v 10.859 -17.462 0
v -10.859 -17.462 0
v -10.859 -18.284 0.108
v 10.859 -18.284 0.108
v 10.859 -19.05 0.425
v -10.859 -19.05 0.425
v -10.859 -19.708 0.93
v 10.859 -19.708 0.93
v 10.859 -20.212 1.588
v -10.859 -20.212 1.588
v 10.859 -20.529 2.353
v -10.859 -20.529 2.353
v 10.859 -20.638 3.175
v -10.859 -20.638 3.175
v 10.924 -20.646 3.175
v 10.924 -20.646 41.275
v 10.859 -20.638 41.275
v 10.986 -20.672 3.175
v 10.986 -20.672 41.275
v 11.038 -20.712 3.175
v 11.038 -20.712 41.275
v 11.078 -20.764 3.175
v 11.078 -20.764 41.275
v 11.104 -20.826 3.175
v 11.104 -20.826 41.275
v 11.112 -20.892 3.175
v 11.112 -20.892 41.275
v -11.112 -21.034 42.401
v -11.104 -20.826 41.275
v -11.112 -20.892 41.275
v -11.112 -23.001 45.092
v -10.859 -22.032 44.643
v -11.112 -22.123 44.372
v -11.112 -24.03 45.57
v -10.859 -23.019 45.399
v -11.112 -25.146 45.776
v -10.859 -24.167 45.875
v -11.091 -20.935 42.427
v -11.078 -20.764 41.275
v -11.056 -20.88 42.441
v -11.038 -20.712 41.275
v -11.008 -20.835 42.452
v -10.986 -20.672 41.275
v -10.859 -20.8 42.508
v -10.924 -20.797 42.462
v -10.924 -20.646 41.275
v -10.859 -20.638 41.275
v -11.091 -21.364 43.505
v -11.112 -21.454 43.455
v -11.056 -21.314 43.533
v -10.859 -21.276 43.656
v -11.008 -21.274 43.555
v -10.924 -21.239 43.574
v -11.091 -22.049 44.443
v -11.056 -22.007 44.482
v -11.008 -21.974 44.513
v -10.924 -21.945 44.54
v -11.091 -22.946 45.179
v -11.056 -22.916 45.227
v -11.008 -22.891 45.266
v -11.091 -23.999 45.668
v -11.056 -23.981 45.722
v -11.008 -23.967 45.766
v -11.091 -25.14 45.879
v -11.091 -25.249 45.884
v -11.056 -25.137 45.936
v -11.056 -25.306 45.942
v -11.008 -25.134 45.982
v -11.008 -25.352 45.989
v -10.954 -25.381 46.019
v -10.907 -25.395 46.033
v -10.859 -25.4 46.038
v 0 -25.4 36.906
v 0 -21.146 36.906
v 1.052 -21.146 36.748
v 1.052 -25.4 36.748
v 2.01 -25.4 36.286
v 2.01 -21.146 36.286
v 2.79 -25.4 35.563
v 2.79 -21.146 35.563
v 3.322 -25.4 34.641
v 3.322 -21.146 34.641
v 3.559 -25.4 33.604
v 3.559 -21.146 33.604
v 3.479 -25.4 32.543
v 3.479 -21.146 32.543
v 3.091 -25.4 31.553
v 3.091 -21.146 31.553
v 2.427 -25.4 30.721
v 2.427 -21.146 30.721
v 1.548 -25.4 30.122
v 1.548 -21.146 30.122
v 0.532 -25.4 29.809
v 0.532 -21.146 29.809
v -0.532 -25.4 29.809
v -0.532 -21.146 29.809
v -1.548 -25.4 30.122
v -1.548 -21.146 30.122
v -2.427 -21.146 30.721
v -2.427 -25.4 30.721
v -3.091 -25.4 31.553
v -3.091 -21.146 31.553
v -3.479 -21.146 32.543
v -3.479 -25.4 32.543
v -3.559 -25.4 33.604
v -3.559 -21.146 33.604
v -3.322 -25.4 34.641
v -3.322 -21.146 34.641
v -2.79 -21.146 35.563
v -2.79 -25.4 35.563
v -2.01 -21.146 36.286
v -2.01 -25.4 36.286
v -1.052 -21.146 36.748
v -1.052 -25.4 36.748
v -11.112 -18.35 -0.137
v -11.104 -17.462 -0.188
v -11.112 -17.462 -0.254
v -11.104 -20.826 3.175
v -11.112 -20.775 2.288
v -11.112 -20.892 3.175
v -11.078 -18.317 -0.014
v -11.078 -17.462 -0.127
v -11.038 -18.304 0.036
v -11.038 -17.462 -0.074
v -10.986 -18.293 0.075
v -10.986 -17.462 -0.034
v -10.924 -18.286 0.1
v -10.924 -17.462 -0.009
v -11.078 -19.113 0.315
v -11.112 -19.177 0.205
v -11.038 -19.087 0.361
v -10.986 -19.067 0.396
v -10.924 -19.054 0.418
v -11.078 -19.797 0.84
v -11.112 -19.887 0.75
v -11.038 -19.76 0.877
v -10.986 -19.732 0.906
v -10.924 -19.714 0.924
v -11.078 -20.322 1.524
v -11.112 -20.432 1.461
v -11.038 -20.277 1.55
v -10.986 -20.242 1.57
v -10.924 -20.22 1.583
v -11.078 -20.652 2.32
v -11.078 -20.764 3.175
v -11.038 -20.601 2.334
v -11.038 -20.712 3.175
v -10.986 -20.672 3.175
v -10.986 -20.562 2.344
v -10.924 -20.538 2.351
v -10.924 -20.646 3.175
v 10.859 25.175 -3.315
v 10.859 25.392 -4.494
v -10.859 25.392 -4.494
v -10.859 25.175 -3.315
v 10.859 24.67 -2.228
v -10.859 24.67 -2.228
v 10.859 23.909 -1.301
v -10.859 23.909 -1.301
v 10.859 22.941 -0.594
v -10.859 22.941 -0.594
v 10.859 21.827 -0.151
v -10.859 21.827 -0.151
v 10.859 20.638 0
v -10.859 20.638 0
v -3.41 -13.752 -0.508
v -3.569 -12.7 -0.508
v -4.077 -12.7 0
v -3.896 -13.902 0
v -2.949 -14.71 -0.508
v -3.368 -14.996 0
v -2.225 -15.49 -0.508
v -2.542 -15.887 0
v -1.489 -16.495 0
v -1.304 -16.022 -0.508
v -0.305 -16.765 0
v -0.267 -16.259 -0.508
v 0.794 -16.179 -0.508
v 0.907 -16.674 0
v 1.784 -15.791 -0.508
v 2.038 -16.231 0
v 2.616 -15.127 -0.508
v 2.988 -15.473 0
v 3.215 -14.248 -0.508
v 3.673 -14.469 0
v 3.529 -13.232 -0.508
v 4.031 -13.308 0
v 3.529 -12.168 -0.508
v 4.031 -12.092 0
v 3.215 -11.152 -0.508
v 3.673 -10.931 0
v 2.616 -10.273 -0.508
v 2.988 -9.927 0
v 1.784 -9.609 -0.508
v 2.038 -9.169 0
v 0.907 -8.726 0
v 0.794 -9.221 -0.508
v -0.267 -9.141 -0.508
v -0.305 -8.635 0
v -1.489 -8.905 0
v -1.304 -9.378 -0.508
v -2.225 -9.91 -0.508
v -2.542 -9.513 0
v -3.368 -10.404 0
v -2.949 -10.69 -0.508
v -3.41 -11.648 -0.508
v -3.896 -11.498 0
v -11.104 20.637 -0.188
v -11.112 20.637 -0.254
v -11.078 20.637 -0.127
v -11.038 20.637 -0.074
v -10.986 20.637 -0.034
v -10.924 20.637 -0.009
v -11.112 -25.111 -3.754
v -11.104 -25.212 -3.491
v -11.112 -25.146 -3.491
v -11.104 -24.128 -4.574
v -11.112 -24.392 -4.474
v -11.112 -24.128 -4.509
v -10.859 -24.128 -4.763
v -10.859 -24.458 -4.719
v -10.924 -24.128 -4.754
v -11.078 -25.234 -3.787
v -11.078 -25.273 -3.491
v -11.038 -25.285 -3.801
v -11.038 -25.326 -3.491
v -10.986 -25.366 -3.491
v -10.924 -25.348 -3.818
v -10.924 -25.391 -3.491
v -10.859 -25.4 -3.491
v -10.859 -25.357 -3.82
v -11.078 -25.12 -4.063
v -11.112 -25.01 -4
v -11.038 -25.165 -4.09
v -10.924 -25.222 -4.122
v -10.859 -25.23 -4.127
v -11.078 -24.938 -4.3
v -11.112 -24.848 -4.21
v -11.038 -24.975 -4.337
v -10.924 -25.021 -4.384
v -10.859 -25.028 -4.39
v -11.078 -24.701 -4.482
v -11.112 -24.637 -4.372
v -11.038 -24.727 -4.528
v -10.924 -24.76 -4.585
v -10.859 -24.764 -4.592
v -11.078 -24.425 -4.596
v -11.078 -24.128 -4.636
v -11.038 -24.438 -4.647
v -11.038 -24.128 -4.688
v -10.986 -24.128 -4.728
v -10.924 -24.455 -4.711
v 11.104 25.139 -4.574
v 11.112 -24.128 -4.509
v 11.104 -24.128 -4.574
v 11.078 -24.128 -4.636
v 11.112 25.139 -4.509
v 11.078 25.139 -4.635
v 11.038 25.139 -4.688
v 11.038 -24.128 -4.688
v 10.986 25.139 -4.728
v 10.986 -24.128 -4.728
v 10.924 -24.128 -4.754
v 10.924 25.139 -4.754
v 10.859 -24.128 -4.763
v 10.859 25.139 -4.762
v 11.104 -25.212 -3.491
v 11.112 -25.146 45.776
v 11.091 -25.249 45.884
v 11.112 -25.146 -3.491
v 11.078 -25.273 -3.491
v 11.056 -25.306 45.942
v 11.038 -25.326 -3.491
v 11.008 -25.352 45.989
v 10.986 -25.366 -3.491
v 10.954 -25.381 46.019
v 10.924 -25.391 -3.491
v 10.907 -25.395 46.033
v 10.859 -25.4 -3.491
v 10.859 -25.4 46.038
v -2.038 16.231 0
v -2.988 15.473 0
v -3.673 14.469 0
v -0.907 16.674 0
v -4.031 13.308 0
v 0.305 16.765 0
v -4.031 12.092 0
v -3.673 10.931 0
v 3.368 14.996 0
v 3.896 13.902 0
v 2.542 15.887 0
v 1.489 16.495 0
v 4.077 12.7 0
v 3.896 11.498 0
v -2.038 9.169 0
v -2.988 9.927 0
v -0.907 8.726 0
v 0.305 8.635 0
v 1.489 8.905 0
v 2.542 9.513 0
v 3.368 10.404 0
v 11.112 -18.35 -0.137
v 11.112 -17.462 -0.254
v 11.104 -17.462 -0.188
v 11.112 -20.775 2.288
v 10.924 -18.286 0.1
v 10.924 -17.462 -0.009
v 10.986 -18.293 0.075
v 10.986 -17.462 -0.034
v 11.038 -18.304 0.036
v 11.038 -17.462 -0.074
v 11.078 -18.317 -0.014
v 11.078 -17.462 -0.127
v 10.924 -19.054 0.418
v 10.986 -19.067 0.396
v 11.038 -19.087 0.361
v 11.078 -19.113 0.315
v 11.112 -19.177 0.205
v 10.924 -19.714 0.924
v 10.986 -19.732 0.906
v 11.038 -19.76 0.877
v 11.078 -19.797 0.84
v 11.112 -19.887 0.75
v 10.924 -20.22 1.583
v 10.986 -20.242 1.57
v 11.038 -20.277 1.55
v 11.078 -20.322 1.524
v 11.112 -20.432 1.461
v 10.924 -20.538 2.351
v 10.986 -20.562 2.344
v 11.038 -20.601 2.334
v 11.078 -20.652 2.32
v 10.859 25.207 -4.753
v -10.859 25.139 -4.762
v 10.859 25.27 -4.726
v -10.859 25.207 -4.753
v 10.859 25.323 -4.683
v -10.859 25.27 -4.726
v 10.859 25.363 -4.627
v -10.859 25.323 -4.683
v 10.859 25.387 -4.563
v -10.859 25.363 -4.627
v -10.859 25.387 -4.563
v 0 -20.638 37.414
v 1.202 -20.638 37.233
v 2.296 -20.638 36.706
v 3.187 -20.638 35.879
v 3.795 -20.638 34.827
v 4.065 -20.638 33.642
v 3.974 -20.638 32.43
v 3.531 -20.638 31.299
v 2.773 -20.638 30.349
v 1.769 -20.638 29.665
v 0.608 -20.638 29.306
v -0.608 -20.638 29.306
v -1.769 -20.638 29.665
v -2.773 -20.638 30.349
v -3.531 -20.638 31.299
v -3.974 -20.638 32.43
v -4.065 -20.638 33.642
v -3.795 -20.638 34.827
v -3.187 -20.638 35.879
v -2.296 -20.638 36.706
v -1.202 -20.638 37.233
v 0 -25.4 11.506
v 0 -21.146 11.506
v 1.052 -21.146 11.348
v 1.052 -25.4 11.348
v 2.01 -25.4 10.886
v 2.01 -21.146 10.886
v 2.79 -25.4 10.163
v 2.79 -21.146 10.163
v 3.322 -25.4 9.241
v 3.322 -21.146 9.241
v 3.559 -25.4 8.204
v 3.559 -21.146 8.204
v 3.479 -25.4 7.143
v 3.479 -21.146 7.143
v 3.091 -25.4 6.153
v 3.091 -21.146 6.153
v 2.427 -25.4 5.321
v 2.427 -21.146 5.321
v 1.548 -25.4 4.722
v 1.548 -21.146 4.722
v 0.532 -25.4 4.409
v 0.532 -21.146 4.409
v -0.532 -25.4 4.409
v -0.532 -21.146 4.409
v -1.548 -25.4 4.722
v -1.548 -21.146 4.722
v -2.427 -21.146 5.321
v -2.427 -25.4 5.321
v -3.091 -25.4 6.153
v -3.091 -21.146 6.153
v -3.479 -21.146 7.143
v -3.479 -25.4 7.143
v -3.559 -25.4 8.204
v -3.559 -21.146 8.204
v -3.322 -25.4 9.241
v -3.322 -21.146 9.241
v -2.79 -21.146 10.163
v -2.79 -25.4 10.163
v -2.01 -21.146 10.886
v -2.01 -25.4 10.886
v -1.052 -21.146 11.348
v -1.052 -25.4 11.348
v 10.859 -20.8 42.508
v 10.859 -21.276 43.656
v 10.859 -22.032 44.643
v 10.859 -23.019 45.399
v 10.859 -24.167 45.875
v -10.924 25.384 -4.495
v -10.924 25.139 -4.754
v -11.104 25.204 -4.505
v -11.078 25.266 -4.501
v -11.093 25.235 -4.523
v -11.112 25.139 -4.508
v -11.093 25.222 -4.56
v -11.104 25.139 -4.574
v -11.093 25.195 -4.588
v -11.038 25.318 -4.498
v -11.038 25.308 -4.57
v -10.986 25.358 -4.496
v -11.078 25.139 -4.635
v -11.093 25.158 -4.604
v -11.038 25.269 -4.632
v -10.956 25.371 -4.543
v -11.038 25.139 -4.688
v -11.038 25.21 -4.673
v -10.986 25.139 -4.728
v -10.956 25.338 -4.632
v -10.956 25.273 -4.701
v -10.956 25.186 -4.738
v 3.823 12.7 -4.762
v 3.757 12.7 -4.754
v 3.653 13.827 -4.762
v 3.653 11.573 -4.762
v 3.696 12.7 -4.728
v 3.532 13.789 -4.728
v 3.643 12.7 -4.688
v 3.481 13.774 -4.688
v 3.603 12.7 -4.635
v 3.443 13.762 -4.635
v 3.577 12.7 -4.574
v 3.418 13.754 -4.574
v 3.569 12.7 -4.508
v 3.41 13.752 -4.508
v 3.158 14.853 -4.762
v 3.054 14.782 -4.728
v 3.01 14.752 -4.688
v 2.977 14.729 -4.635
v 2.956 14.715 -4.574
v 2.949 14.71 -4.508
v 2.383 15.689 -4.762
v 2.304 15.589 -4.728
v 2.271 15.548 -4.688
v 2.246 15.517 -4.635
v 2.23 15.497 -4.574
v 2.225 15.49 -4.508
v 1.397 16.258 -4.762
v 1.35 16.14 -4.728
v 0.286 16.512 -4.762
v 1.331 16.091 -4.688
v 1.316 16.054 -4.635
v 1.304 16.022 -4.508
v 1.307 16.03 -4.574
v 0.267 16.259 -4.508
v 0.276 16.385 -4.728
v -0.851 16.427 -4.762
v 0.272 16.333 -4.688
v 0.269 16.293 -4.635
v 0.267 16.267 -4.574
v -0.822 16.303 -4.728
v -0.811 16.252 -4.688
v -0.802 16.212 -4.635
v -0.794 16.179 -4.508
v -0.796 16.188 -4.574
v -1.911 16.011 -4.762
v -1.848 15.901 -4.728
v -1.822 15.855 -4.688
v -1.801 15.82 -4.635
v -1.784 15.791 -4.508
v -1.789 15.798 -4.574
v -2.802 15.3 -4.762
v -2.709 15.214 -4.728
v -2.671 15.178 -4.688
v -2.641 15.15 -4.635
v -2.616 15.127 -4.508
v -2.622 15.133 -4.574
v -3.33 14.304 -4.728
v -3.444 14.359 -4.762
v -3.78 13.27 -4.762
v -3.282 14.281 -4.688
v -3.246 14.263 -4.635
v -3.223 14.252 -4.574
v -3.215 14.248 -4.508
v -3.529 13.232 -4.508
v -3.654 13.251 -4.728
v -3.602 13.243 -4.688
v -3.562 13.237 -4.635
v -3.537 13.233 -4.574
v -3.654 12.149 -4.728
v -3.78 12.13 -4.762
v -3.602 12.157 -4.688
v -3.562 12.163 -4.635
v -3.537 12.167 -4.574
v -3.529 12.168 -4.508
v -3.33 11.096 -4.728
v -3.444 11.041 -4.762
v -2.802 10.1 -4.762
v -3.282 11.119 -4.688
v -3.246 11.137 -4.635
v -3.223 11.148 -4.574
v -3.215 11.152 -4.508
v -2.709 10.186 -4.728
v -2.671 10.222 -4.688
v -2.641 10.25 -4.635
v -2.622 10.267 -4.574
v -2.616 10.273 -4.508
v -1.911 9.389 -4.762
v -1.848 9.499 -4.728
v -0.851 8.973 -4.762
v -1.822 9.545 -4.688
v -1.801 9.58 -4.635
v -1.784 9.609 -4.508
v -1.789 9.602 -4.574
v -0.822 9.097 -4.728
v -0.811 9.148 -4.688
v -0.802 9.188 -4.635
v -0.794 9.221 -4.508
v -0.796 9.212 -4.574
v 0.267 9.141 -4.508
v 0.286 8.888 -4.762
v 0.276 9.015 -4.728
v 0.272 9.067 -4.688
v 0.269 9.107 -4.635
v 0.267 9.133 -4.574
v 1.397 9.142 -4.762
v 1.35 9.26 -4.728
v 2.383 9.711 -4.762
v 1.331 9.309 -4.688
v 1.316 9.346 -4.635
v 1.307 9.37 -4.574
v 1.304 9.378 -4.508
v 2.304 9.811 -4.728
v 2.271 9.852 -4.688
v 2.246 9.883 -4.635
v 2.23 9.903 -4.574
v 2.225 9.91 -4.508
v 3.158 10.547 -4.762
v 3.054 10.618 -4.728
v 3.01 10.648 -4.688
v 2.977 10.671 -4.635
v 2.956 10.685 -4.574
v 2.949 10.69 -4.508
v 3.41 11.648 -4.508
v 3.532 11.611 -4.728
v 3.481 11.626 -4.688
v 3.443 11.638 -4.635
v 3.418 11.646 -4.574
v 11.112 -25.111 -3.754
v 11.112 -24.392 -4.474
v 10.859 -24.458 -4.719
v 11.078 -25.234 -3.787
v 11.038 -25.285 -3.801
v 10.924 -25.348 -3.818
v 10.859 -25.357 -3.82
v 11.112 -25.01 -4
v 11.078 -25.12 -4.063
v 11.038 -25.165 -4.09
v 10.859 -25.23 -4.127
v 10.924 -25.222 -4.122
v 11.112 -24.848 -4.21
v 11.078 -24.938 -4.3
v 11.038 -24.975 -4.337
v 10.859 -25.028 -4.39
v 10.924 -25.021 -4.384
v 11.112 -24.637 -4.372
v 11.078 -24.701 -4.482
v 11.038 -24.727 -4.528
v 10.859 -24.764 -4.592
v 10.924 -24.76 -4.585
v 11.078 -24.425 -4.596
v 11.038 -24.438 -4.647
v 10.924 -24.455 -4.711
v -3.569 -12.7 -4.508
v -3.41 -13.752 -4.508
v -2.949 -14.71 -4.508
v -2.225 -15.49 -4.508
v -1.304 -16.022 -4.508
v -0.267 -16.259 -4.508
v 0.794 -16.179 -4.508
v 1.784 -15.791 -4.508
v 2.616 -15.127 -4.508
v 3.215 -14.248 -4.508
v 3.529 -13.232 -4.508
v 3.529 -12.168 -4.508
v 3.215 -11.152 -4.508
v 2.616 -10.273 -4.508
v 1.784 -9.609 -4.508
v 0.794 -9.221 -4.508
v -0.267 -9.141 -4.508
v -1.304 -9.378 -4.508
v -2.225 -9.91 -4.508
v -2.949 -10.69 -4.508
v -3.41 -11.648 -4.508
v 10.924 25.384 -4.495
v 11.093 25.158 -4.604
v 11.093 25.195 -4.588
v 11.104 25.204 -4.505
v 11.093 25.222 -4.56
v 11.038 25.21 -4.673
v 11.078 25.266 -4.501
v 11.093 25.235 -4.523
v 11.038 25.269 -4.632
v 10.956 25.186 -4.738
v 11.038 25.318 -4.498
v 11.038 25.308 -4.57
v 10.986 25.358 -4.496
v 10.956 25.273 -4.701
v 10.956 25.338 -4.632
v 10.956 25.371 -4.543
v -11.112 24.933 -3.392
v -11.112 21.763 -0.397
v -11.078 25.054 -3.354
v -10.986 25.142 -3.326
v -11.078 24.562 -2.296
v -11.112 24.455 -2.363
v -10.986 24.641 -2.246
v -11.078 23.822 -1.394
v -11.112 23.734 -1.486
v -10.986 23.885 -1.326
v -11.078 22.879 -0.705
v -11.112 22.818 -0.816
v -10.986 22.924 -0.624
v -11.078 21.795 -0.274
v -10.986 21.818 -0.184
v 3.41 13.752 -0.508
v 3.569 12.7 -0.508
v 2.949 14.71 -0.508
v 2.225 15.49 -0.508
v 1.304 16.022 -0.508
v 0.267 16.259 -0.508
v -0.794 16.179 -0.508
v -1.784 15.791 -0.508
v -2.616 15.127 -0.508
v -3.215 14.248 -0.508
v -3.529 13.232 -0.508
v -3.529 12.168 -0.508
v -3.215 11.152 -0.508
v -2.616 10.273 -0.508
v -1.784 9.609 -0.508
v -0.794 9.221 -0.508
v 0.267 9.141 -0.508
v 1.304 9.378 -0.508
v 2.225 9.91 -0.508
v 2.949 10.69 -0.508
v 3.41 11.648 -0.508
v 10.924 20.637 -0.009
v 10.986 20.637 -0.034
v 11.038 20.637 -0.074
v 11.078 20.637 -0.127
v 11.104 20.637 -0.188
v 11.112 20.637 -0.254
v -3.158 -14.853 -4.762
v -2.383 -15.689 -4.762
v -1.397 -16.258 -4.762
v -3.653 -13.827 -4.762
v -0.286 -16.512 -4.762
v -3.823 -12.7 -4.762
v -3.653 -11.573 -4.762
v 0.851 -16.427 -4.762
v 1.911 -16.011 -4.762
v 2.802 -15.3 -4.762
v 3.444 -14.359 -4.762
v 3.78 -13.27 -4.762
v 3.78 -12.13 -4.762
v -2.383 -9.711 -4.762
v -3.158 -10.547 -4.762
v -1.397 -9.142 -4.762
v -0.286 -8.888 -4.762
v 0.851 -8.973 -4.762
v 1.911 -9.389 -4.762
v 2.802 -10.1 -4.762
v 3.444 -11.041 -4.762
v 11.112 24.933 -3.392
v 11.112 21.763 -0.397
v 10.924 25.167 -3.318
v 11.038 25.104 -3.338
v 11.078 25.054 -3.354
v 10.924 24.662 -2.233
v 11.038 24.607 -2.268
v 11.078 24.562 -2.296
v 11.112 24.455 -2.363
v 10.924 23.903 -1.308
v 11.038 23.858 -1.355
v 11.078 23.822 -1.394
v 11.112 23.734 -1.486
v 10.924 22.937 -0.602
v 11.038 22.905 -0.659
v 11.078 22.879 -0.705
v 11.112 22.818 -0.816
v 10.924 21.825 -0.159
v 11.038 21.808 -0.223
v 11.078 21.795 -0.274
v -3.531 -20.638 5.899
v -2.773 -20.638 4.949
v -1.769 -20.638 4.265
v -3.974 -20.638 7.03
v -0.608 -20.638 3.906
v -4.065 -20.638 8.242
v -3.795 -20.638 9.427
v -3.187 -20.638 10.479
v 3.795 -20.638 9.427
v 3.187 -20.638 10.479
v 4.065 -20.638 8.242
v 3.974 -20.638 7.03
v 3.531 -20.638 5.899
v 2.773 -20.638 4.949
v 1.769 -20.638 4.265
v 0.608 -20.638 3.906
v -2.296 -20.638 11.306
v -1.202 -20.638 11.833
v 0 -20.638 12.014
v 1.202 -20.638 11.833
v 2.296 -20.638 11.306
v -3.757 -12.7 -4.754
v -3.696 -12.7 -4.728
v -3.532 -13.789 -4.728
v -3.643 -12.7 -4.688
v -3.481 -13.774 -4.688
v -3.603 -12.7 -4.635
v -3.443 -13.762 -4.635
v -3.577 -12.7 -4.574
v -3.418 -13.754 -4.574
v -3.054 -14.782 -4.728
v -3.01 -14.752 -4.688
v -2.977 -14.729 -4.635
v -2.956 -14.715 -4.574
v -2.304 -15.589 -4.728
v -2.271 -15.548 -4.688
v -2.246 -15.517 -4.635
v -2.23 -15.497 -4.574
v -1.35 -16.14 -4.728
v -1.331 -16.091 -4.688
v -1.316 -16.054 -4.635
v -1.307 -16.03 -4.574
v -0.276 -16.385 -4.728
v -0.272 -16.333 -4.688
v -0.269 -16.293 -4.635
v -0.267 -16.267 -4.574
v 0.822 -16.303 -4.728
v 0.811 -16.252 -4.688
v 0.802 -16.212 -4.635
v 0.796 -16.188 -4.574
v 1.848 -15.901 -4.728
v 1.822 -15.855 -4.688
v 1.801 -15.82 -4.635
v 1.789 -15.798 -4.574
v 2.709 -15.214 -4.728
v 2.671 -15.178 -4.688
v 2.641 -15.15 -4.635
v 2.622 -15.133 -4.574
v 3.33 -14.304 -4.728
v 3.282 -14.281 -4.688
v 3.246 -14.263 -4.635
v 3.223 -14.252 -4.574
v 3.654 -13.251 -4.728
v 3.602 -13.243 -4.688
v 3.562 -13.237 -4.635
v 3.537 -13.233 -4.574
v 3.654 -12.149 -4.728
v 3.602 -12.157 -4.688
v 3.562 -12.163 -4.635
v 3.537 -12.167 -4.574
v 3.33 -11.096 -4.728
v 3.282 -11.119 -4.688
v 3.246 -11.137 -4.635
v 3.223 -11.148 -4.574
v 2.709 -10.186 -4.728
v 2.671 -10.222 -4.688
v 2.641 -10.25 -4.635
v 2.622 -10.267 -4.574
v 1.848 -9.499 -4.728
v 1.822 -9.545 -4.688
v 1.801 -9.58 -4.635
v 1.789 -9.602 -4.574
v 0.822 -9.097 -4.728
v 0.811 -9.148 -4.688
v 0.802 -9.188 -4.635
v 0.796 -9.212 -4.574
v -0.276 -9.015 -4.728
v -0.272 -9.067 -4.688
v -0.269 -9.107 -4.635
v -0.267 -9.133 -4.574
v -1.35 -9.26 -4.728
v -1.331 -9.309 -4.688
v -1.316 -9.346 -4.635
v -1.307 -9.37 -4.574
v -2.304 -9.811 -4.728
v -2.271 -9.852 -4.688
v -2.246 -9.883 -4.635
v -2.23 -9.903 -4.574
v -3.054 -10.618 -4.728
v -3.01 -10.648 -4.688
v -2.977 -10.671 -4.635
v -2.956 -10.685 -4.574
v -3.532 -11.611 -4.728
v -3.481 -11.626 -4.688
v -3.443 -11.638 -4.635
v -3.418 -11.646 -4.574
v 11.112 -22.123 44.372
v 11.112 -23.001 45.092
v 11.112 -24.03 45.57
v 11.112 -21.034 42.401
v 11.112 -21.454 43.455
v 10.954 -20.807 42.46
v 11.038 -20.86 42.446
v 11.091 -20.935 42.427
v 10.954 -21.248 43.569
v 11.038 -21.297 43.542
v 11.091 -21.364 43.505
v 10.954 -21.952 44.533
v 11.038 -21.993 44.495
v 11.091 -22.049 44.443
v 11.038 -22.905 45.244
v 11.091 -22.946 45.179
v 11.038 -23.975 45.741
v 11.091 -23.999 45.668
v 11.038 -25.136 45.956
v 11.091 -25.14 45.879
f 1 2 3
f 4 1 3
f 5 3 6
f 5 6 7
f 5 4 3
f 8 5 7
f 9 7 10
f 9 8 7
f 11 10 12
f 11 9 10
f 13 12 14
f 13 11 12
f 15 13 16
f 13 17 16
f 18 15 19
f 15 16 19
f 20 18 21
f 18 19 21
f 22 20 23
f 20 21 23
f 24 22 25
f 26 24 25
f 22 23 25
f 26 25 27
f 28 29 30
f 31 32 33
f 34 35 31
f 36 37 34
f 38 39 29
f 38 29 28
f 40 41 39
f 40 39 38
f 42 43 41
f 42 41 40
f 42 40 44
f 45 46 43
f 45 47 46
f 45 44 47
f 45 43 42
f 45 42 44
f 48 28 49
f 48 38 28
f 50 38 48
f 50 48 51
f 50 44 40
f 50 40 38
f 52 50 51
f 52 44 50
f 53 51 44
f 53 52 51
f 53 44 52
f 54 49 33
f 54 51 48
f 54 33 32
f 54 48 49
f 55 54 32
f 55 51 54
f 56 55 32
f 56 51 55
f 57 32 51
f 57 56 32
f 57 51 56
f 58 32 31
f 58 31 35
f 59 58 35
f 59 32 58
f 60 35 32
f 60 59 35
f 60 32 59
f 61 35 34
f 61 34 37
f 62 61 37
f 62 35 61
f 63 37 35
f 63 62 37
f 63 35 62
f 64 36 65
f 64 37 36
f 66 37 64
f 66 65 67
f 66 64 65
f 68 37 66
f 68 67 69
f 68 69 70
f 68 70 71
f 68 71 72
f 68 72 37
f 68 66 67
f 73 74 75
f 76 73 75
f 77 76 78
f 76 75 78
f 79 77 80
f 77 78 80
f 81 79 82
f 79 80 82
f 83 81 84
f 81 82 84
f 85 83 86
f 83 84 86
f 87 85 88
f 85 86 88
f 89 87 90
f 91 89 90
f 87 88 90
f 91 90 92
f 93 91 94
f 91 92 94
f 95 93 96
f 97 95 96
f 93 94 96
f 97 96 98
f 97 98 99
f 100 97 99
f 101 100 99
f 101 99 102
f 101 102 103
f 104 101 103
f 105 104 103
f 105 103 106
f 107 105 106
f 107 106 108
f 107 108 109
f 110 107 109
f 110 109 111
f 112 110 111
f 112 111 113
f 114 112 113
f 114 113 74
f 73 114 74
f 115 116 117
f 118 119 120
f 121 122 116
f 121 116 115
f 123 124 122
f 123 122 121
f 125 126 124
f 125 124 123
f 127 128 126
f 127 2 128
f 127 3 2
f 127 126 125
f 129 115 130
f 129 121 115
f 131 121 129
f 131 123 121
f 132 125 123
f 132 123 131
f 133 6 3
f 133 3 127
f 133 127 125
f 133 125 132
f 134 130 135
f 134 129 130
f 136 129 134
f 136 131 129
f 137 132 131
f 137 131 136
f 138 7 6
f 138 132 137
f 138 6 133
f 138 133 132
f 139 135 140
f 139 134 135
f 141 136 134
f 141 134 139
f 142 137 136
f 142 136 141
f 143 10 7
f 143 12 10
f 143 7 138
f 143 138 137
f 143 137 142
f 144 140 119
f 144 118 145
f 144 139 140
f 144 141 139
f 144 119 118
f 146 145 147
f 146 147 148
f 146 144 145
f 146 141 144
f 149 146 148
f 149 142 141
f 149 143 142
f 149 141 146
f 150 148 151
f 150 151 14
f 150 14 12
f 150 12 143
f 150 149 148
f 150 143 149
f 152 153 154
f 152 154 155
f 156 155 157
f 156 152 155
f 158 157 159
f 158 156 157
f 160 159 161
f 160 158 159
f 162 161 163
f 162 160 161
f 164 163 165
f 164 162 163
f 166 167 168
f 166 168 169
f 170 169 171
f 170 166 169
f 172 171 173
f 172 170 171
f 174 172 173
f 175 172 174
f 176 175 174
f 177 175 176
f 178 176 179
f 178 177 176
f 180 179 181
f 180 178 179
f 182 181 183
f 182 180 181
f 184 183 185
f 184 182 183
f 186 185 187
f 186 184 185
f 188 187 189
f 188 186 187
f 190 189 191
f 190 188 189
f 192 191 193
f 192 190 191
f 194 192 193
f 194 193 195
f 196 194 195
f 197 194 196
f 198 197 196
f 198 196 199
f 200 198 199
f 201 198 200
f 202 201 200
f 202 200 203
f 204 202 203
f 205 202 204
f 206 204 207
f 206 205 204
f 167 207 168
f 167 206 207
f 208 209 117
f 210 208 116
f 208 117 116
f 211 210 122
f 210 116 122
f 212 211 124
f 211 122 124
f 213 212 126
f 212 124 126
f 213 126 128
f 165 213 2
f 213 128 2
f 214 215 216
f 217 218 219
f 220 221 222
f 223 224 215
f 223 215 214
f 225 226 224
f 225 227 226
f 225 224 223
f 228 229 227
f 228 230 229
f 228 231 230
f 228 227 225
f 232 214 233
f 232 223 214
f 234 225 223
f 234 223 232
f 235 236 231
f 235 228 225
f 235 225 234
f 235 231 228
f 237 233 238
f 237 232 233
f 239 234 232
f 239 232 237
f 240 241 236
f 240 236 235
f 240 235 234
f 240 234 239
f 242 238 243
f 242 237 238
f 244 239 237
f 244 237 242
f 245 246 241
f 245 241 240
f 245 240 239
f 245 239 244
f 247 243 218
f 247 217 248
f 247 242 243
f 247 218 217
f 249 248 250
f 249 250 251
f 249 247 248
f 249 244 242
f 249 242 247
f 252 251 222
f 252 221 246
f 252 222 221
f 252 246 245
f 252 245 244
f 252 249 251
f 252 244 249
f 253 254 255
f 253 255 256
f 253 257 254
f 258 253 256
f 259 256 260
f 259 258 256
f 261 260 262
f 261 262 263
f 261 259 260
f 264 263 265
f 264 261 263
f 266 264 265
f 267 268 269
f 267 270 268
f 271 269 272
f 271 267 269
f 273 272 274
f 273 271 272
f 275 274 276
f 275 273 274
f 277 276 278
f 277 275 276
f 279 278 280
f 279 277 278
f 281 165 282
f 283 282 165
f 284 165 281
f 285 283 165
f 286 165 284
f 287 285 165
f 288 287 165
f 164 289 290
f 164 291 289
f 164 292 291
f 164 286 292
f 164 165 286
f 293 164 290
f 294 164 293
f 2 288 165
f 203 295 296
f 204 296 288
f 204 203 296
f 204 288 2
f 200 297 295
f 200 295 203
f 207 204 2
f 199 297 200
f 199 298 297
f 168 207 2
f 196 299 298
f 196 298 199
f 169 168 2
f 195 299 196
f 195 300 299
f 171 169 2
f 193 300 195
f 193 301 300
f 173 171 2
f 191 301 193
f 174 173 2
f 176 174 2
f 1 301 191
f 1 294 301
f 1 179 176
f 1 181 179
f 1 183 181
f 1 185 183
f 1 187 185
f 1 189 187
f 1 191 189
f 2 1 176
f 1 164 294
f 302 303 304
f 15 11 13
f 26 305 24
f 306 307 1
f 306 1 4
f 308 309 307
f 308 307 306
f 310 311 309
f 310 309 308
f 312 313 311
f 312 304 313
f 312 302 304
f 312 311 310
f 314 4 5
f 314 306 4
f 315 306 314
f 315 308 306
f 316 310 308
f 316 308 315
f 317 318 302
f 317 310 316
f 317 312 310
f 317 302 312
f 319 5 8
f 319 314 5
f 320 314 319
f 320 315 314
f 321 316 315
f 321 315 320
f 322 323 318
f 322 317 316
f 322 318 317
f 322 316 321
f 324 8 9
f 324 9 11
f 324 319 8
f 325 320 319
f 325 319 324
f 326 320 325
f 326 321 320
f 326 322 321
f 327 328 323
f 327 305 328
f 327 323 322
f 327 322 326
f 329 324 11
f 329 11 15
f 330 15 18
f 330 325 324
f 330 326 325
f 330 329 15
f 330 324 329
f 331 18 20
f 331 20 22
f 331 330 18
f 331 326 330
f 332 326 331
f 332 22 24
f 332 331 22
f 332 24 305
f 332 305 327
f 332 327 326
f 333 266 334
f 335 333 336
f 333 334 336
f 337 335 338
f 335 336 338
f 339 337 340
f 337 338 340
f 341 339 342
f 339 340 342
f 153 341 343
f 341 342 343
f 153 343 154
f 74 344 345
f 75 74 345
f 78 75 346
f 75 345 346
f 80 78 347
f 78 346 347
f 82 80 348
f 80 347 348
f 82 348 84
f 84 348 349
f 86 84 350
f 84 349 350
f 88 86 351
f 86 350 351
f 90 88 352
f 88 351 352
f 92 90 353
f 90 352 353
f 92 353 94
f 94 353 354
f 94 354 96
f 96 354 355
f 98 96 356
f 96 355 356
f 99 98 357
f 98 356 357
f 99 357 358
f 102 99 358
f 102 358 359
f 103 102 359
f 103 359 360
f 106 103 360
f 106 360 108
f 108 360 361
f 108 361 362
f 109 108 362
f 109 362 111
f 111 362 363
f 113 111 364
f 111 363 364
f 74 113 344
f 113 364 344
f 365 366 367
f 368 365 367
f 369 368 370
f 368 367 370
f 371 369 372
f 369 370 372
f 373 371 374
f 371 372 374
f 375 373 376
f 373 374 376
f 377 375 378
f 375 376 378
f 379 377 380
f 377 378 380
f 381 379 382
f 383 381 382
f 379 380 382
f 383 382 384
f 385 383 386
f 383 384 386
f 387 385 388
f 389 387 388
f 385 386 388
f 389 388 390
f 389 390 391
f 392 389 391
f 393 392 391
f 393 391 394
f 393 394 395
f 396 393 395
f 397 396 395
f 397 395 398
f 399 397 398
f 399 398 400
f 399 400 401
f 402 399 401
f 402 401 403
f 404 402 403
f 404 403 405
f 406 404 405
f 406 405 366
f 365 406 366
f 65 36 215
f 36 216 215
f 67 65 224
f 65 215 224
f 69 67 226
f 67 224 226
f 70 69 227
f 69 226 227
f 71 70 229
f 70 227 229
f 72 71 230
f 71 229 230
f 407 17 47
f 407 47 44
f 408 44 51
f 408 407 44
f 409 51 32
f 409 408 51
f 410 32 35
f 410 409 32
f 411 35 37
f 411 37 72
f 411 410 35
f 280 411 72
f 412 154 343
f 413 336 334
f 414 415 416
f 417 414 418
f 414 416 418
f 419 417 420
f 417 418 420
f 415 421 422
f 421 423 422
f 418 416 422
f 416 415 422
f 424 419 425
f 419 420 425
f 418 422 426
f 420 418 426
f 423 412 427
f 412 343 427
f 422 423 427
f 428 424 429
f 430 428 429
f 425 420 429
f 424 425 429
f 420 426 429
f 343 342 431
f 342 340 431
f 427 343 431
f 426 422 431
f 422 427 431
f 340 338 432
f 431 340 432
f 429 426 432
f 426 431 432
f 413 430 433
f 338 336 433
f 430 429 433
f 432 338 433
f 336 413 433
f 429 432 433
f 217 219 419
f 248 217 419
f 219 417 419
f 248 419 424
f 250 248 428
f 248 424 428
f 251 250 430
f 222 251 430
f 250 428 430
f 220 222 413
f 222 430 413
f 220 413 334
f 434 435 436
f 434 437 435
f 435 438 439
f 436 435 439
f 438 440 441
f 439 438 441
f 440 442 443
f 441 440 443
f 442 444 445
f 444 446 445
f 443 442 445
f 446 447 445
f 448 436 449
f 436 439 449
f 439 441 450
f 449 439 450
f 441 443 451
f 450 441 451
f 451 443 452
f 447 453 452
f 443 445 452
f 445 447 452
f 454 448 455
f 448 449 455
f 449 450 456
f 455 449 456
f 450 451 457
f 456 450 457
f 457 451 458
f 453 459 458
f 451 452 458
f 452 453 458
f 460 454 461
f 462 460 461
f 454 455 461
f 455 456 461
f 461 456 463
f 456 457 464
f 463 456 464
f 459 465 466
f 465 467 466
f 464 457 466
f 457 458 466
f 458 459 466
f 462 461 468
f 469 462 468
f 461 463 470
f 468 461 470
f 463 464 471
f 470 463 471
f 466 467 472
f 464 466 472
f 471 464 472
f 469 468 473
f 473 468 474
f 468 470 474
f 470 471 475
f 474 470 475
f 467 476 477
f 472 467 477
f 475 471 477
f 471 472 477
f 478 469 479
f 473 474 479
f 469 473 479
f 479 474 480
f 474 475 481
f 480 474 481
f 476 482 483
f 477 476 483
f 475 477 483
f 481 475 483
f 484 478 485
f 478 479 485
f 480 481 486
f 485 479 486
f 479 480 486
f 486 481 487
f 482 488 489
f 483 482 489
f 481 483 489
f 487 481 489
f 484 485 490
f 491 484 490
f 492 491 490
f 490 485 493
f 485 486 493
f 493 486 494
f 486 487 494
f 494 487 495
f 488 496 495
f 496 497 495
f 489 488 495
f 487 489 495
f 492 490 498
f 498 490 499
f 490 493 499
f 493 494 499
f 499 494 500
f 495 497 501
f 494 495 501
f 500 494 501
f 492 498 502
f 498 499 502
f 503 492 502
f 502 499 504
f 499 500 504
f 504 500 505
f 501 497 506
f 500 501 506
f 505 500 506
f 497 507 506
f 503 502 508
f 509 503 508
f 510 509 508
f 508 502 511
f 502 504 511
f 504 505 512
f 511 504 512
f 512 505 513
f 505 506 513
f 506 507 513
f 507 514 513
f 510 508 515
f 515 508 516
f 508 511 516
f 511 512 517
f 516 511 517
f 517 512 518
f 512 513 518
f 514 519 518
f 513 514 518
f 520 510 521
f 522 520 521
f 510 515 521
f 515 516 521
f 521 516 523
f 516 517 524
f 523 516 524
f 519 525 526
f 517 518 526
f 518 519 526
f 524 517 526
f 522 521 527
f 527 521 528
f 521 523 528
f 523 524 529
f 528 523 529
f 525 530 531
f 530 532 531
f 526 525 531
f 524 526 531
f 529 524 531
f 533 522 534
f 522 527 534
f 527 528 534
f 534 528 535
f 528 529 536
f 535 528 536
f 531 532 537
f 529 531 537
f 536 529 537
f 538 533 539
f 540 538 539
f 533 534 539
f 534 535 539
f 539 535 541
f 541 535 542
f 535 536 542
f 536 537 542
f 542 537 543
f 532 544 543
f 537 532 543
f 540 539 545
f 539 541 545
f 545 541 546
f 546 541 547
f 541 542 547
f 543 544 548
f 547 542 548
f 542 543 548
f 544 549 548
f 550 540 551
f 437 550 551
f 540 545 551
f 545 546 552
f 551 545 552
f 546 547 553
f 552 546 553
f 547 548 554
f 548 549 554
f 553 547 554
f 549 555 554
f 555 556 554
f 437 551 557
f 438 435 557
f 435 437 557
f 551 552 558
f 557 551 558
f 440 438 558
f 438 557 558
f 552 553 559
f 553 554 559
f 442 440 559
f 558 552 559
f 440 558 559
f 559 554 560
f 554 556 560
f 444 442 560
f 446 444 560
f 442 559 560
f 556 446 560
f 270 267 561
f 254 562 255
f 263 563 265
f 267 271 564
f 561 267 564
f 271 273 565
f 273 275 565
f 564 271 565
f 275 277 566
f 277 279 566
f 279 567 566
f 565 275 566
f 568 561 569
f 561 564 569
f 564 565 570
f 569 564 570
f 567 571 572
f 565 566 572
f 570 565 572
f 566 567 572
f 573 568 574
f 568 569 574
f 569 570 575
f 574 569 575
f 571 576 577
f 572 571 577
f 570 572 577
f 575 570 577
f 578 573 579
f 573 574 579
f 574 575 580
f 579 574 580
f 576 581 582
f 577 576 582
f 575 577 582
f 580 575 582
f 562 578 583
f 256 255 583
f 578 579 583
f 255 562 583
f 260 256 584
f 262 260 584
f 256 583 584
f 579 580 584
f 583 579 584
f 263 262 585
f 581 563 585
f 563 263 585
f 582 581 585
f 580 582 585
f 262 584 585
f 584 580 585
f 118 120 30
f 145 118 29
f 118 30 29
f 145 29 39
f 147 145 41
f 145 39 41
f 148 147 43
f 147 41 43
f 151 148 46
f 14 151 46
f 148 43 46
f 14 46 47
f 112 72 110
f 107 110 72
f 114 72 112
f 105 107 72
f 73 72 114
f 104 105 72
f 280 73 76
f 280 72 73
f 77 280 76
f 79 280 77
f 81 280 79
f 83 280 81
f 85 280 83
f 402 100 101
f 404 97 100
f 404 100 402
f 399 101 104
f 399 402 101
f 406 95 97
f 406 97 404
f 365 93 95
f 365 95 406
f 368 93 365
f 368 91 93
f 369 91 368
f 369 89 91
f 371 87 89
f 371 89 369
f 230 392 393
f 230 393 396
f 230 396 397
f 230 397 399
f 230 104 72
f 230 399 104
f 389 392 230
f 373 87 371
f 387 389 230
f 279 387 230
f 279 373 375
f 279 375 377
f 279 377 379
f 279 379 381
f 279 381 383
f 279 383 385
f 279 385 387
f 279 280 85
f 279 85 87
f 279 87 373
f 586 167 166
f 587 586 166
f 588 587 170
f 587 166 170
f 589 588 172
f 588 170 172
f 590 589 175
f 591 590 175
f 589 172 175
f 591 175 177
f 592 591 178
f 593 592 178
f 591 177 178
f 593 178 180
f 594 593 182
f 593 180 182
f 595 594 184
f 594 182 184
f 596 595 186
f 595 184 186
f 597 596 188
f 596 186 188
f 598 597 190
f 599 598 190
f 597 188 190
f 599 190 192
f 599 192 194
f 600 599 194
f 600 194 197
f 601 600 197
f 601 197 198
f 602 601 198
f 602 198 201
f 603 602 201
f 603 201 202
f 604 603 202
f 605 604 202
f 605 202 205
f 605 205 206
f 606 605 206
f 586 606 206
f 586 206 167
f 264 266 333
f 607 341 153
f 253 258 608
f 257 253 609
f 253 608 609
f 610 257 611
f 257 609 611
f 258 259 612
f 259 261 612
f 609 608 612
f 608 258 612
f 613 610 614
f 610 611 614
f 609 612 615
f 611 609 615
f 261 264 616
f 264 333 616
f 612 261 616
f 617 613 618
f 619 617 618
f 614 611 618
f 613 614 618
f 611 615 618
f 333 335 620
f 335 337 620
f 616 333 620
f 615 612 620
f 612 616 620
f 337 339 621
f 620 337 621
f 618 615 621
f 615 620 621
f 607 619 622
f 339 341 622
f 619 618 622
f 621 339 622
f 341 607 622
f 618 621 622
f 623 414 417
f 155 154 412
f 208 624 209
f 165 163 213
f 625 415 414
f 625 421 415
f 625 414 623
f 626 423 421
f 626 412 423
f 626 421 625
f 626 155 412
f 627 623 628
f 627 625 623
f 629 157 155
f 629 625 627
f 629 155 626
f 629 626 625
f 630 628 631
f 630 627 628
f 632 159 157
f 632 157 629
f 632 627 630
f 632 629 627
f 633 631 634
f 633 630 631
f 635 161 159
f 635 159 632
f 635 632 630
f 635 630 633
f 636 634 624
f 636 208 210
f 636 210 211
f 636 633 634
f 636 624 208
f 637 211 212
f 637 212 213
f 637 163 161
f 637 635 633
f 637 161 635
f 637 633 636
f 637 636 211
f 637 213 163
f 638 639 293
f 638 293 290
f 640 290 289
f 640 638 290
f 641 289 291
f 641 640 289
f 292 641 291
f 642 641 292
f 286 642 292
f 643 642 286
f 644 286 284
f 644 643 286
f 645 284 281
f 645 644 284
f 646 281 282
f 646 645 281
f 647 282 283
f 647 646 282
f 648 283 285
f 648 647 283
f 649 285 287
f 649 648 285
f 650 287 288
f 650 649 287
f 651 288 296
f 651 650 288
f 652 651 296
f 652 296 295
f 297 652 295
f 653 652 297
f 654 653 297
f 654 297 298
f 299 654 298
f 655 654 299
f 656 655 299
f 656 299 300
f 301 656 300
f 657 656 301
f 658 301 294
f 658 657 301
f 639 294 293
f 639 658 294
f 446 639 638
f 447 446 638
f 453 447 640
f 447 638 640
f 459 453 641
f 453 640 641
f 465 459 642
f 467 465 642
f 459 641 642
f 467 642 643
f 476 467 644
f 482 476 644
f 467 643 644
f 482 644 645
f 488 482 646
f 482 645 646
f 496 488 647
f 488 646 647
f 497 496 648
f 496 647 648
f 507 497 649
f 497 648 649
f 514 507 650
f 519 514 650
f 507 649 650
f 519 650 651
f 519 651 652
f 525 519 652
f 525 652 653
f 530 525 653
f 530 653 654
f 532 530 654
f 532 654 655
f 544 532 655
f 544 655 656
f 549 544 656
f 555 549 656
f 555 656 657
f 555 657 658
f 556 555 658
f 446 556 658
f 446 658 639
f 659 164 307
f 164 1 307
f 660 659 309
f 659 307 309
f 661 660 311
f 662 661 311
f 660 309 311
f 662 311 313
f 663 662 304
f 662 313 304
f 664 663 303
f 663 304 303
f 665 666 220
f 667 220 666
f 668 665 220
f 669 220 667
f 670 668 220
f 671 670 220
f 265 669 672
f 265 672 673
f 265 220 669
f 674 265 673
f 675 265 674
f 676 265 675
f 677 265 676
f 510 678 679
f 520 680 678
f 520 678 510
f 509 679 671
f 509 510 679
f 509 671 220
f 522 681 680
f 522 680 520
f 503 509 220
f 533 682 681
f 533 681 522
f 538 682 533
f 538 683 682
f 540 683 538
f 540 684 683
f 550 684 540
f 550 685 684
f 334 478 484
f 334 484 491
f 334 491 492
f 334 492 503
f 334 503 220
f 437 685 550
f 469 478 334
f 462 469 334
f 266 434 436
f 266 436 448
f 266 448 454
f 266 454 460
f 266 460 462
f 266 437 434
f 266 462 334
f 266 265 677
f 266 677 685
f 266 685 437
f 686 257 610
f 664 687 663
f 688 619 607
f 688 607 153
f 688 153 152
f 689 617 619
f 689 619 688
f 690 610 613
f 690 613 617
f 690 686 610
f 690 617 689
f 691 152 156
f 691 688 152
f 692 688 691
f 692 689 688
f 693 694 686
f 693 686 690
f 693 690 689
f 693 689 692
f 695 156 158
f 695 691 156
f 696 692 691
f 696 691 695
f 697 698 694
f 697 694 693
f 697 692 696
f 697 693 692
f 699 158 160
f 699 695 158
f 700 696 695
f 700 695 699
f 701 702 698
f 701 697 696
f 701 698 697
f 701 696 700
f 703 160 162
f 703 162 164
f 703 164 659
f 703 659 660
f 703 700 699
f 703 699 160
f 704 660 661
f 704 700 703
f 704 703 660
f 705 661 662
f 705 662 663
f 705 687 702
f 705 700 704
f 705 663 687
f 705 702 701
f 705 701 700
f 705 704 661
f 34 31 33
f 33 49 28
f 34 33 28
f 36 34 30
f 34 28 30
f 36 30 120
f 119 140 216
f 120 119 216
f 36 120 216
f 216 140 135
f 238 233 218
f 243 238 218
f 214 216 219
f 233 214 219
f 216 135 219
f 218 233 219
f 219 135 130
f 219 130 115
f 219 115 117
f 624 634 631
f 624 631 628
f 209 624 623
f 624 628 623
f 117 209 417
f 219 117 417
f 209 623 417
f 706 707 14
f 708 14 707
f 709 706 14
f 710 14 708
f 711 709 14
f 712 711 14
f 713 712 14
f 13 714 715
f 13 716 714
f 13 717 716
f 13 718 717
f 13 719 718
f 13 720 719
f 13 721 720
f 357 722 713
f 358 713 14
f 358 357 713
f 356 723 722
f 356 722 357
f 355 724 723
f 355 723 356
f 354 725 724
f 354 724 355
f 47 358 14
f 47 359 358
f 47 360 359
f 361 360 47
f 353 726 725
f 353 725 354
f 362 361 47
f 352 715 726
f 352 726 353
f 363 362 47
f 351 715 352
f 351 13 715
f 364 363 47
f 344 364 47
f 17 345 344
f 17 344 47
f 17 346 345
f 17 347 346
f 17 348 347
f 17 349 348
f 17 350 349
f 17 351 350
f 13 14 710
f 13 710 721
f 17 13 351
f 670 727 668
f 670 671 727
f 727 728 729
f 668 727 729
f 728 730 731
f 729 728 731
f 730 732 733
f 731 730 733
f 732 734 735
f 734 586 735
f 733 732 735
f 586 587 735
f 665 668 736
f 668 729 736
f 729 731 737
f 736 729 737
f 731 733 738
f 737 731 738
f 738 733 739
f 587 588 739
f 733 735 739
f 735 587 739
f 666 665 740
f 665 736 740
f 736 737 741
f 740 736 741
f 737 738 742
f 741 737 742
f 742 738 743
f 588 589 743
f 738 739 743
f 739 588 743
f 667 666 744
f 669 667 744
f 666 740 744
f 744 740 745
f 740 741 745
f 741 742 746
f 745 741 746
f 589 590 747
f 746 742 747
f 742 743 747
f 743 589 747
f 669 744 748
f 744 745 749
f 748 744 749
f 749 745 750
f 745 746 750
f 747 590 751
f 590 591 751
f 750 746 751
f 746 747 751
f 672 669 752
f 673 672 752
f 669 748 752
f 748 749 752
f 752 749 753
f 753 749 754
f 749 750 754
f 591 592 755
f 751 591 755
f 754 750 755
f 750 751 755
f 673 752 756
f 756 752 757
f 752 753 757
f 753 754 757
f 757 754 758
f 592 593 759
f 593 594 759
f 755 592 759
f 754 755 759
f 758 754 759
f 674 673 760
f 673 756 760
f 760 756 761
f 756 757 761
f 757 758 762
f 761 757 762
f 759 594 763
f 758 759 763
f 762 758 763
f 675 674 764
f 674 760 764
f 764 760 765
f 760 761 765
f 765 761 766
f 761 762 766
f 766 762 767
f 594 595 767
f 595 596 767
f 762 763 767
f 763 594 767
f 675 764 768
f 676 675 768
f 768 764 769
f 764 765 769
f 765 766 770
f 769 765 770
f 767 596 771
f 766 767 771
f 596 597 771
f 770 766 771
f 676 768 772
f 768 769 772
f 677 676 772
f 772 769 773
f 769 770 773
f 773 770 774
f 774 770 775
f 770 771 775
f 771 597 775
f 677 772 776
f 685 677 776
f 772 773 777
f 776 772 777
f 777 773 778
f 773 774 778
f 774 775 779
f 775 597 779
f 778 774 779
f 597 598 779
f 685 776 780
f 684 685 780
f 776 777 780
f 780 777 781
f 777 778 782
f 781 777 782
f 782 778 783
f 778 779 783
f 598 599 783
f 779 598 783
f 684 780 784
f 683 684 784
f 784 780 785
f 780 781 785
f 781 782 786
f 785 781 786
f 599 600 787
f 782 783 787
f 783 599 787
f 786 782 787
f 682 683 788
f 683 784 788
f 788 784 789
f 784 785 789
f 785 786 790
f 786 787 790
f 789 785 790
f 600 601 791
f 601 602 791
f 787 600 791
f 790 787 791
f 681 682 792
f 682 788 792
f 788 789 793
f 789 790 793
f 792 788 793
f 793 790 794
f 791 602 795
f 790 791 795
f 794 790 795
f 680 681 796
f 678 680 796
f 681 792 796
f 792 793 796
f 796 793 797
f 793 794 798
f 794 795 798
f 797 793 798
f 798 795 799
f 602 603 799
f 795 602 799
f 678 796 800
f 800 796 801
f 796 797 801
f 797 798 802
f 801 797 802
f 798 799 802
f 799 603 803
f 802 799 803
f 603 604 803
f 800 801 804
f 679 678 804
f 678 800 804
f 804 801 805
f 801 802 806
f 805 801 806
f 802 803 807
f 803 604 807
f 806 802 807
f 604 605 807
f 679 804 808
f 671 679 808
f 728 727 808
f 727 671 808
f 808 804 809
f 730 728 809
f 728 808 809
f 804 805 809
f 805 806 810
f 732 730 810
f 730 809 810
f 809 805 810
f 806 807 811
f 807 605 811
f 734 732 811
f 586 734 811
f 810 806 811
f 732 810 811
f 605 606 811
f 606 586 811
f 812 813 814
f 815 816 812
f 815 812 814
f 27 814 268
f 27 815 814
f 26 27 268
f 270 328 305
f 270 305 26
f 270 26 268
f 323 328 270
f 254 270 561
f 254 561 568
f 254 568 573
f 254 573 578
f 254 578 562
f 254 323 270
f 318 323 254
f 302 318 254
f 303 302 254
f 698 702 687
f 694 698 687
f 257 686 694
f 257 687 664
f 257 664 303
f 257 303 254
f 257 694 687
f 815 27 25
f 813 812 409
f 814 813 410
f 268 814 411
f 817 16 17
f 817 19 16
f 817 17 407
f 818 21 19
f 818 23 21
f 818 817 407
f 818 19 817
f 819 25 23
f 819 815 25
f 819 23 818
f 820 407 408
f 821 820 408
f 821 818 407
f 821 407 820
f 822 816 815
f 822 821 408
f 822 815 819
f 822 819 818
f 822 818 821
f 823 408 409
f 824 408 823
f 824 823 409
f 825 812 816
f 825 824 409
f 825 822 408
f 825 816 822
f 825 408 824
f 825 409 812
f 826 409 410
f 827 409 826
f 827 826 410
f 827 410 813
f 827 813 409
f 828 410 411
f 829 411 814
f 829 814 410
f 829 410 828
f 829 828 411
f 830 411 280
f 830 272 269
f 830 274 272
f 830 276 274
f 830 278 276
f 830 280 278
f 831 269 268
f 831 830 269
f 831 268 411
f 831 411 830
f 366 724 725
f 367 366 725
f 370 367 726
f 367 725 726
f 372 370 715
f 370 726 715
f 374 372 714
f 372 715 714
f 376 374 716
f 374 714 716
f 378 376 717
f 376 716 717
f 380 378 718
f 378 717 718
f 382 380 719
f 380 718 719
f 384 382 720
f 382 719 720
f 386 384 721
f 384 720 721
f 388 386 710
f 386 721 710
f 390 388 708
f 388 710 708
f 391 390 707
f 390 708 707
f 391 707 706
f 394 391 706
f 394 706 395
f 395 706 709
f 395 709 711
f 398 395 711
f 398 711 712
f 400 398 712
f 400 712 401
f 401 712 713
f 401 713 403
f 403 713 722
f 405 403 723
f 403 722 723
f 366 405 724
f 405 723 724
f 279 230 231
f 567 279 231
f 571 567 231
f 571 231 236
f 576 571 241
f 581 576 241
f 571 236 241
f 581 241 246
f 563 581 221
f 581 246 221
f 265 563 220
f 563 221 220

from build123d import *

# Parameters (mm, degrees)
BOSS_EXTRUDE1_START = 11.1125
BOSS_EXTRUDE1_DEPTH = 22.225
FILLET1_R           = 1.2715875
SKETCH4_R           = 3.5687
CUT_EXTRUDE1_DEPTH  = 54.741037043
SKETCH6_R           = 3.5687
CUT_EXTRUDE3_DEPTH  = 7.874
CHAMFER1_SIZE       = 0.508
FILLET2_R           = 0.254


with BuildPart() as part:
    # Sketch3 → Boss-Extrude1 (new body)
    with BuildSketch(Plane(origin=(0, 0, 0), x_dir=(0, 0, -1), z_dir=(1, 0, 0)).offset(BOSS_EXTRUDE1_START)):
        with BuildLine():
            Line((-3.175, -20.6375), (-41.275, -20.6375))
            ThreePointArc((-41.275, -20.6375), (-44.642596045, -22.032403955), (-46.0375, -25.4))
            Line((-46.0375, -25.4), (4.7625, -25.4))
            Line((4.7625, -25.4), (4.7625, 25.4))
            ThreePointArc((4.7625, 25.4), (1.394903955, 24.005096045), (0, 20.6375))
            Line((0, 20.6375), (0, -17.4625))
            ThreePointArc((0, -17.4625), (-0.92993597, -19.70756403), (-3.175, -20.6375))
        make_face()
    extrude(amount=-BOSS_EXTRUDE1_DEPTH)

    # Fillet1
    fillet1_edges = [part.edges().sort_by_distance(p)[0] for p in [
        (0, -25.4, -4.7625),
    ]]
    fillet(fillet1_edges, radius=FILLET1_R)

    # Sketch4 → Cut-Extrude1 (cut, through all)
    with BuildSketch(Plane.XY):
        with Locations((0, 12.7)):
            Circle(SKETCH4_R)
        with Locations(Location((0, -12.7, 0), (0, 0, 180))):
            Circle(SKETCH4_R)
    extrude(amount=-CUT_EXTRUDE1_DEPTH, mode=Mode.SUBTRACT)

    # Sketch6 → Cut-Extrude3 (cut)
    with BuildSketch(Plane(origin=(0, -20.6375, 0), x_dir=(1, 0, 0), z_dir=(0, 1, 0))):
        with Locations(Location((0, -7.9375, 0), (0, 0, 270))):
            Circle(SKETCH6_R)
        with Locations(Location((0, -33.3375, 0), (0, 0, 270))):
            Circle(SKETCH6_R)
    extrude(amount=-CUT_EXTRUDE3_DEPTH, mode=Mode.SUBTRACT)

    # Chamfer1
    chamfer1_edges = [part.edges().sort_by_distance(p)[0] for p in [
        (-3.5687, 12.7, 0),
        (3.5687, -12.7, 0),
        (0, -20.6375, 4.3688),
        (0, -20.6375, 29.7688),
    ]]
    chamfer(chamfer1_edges, length=CHAMFER1_SIZE)

    # Fillet2
    fillet2_edges = [part.edges().sort_by_distance(p)[0] for p in [
        (0, 25.4, -4.7625),
        (-11.1125, 24.005096045, -1.394903955),
        (-11.1125, 1.5875, 0),
        (-11.1125, -19.70756403, 0.92993597),
        (-11.1125, -20.6375, 22.225),
        (11.1125, 0.63579375, -4.7625),
        (11.1125, -25.027560644, -4.390060644),
        (-11.1125, 0.63579375, -4.7625),
        (-11.1125, -25.027560644, -4.390060644),
        (-3.5687, 12.7, -4.7625),
        (3.5687, -12.7, -4.7625),
        (-11.1125, -22.032403955, 44.642596045),
        (11.1125, -20.6375, 22.225),
        (-11.1125, -25.4, 21.27329375),
        (11.1125, -19.70756403, 0.92993597),
        (11.1125, 1.5875, 0),
        (11.1125, 24.005096045, -1.394903955),
        (11.1125, -25.4, 21.27329375),
        (11.1125, -22.032403955, 44.642596045),
    ]]
    fillet(fillet2_edges, radius=FILLET2_R)


solid = part.part
